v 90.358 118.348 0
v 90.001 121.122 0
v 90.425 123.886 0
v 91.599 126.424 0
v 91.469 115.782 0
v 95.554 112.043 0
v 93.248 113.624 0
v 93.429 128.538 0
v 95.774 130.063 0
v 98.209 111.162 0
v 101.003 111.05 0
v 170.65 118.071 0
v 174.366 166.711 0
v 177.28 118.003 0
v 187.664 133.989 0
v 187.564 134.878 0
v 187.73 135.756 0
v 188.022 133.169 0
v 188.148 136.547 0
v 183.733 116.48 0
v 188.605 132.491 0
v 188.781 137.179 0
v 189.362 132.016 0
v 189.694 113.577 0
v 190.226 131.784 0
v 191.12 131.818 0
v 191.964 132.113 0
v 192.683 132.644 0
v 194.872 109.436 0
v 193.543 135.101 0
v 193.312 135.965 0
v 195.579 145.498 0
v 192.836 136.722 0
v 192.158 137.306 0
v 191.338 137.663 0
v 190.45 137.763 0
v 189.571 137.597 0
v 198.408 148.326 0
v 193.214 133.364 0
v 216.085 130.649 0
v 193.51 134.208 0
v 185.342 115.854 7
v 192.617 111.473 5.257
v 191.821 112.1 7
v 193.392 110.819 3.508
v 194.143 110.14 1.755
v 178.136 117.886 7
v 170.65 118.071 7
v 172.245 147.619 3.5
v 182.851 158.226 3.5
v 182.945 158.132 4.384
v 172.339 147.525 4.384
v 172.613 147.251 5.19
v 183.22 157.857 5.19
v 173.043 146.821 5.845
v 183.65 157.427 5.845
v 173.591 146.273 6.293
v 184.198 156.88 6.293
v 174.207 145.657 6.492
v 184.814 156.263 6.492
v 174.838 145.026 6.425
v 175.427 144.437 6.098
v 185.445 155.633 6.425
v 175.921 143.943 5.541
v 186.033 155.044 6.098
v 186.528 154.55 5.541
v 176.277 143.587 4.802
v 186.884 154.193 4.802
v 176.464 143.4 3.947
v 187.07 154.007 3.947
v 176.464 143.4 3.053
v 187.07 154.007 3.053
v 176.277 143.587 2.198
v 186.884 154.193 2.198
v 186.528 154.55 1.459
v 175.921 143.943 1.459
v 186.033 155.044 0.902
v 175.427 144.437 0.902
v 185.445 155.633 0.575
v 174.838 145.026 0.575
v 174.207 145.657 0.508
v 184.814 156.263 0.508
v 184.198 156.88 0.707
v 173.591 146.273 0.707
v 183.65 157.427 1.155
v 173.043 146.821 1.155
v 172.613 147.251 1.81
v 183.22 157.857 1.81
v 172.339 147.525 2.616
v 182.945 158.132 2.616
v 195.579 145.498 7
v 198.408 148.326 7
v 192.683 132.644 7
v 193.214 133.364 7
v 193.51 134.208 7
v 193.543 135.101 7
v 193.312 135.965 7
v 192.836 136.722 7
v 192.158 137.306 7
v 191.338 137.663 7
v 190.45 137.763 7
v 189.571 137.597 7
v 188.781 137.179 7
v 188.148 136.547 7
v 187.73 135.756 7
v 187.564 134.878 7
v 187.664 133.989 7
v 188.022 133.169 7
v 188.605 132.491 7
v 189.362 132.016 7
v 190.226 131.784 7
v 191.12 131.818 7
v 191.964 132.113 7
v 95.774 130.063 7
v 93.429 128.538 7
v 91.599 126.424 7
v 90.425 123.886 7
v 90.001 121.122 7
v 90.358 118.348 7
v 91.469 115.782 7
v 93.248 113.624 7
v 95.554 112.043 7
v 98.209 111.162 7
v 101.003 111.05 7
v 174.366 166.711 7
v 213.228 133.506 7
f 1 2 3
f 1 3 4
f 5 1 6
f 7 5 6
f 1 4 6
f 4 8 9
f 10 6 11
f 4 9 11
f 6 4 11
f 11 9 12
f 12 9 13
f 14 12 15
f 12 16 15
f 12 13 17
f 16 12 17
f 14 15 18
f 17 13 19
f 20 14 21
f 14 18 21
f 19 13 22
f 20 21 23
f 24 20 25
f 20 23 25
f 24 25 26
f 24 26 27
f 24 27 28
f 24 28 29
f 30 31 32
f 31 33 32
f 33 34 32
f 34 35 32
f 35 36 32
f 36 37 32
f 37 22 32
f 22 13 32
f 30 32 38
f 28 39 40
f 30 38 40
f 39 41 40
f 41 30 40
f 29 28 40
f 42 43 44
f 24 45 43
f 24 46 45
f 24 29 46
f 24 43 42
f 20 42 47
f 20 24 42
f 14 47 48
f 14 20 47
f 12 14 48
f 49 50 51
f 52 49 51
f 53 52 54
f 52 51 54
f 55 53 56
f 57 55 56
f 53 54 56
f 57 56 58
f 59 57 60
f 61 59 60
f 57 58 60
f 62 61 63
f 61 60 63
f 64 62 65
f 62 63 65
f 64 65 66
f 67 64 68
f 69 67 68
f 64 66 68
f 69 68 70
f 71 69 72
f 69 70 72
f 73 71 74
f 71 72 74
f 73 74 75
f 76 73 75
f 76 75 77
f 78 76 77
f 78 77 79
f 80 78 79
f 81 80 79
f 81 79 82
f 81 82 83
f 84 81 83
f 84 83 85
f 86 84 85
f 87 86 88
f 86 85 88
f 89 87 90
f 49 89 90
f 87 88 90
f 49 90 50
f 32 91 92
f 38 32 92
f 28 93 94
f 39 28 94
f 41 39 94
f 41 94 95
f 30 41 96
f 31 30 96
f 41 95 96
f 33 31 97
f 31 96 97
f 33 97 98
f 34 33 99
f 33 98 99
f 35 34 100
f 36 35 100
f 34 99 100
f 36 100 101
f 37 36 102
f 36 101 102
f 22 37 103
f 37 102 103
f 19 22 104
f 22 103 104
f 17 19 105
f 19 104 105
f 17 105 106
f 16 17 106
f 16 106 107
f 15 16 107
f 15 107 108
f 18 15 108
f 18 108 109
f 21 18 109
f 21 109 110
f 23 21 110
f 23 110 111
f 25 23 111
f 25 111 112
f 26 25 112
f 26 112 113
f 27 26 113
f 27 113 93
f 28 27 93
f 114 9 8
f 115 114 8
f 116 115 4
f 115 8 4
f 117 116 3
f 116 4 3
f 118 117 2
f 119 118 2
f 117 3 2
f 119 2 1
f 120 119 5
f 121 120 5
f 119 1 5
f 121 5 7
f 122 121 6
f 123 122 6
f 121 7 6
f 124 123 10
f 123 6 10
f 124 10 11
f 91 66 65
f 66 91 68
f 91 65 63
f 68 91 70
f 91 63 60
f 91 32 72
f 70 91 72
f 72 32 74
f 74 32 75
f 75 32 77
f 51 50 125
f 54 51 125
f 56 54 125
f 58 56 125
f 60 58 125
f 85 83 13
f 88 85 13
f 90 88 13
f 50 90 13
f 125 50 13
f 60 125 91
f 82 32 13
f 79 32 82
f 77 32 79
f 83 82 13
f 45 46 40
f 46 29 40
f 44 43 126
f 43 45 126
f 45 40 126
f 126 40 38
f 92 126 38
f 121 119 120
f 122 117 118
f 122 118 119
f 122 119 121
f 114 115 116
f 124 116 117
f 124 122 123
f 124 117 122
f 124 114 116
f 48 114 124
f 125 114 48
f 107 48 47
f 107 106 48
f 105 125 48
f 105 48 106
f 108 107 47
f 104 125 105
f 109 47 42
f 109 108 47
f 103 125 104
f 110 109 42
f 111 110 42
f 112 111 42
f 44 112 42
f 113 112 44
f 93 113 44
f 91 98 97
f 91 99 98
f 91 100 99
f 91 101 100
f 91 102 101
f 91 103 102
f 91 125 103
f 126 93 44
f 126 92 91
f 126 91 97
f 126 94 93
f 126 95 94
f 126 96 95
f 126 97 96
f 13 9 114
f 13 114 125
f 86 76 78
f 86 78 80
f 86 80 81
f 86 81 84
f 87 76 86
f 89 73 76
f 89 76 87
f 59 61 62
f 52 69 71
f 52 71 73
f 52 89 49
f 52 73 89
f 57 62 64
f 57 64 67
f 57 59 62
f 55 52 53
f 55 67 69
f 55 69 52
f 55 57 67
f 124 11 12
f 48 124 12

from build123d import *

# Parameters (mm, degrees)
PAD002_DEPTH             = 7
SKETCH025_R              = 3
POCKET018_DEPTH          = 15
POCKET019_DEPTH          = 98.908358
SKETCH028_R              = 3
POCKET021_DEPTH          = 7.001
CLONE002_PLACEMENT_ANGLE = 45


with BuildPart() as part:
    # Sketch023 → Pad002 (new body)
    with BuildSketch(Plane.XY):
        with BuildLine():
            Line((75.261973, 88.907358), (50.261973, 88.907358))
            Line((50.261973, 84.907358), (50.261973, 88.907358))
            Line((50.261973, 84.907358), (20.261973, 84.907358))
            Line((-9.396926, 3.420201), (20.261973, 84.907358))
            ThreePointArc((-9.396926, 3.420201), (-4.942745, -8.693059), (7.744606, -6.326221))
            Line((7.744606, -6.326221), (52.028155, 47.886022))
            ThreePointArc((75.261973, 58.907358), (62.404289, 56.012339), (52.028155, 47.886022))
            Line((75.261973, 88.907358), (75.261973, 58.907358))
        make_face()
    extrude(amount=PAD002_DEPTH)

    # Sketch025 (on Face4 of Pad002) → Pocket018 (cut)
    with BuildSketch(Plane(origin=(0, 84.907358, 0), x_dir=(-1, 0, 0), z_dir=(0, 1, 0))):
        with Locations((-35.261973, 3.5)):
            Circle(SKETCH025_R)
    extrude(amount=-POCKET018_DEPTH, mode=Mode.SUBTRACT)

    # Sketch026 (on Face2 of Pocket018) → Pocket019 (cut, through all)
    with BuildSketch(Plane(origin=(0, 88.907358, 0), x_dir=(-1, 0, 0), z_dir=(0, 1, 0))):
        Polygon((-75.261973, 7), (-75.261973, 0), (-71.220521, 7), align=None)
    extrude(amount=-POCKET019_DEPTH, mode=Mode.SUBTRACT)

    # Sketch028 → Pocket021 (cut, through all)
    with BuildSketch(Plane.XY.offset(7)):
        with Locations((54.303425, 73.770624)):
            Circle(SKETCH028_R)
    extrude(amount=-POCKET021_DEPTH, mode=Mode.SUBTRACT)


with BuildPart() as part_1:
    # Body002 placement: moved
    add(part.part.moved(Location((-250, 0, 0))))


with BuildPart() as part_2:
    # Clone002 placement: moved
    add(part_1.part.moved(Location((276.776695, -55.776695, 0))).rotate(Axis((276.776695, -55.776695, 0), (0, 0, -1)), CLONE002_PLACEMENT_ANGLE))


solid = part_2.part
